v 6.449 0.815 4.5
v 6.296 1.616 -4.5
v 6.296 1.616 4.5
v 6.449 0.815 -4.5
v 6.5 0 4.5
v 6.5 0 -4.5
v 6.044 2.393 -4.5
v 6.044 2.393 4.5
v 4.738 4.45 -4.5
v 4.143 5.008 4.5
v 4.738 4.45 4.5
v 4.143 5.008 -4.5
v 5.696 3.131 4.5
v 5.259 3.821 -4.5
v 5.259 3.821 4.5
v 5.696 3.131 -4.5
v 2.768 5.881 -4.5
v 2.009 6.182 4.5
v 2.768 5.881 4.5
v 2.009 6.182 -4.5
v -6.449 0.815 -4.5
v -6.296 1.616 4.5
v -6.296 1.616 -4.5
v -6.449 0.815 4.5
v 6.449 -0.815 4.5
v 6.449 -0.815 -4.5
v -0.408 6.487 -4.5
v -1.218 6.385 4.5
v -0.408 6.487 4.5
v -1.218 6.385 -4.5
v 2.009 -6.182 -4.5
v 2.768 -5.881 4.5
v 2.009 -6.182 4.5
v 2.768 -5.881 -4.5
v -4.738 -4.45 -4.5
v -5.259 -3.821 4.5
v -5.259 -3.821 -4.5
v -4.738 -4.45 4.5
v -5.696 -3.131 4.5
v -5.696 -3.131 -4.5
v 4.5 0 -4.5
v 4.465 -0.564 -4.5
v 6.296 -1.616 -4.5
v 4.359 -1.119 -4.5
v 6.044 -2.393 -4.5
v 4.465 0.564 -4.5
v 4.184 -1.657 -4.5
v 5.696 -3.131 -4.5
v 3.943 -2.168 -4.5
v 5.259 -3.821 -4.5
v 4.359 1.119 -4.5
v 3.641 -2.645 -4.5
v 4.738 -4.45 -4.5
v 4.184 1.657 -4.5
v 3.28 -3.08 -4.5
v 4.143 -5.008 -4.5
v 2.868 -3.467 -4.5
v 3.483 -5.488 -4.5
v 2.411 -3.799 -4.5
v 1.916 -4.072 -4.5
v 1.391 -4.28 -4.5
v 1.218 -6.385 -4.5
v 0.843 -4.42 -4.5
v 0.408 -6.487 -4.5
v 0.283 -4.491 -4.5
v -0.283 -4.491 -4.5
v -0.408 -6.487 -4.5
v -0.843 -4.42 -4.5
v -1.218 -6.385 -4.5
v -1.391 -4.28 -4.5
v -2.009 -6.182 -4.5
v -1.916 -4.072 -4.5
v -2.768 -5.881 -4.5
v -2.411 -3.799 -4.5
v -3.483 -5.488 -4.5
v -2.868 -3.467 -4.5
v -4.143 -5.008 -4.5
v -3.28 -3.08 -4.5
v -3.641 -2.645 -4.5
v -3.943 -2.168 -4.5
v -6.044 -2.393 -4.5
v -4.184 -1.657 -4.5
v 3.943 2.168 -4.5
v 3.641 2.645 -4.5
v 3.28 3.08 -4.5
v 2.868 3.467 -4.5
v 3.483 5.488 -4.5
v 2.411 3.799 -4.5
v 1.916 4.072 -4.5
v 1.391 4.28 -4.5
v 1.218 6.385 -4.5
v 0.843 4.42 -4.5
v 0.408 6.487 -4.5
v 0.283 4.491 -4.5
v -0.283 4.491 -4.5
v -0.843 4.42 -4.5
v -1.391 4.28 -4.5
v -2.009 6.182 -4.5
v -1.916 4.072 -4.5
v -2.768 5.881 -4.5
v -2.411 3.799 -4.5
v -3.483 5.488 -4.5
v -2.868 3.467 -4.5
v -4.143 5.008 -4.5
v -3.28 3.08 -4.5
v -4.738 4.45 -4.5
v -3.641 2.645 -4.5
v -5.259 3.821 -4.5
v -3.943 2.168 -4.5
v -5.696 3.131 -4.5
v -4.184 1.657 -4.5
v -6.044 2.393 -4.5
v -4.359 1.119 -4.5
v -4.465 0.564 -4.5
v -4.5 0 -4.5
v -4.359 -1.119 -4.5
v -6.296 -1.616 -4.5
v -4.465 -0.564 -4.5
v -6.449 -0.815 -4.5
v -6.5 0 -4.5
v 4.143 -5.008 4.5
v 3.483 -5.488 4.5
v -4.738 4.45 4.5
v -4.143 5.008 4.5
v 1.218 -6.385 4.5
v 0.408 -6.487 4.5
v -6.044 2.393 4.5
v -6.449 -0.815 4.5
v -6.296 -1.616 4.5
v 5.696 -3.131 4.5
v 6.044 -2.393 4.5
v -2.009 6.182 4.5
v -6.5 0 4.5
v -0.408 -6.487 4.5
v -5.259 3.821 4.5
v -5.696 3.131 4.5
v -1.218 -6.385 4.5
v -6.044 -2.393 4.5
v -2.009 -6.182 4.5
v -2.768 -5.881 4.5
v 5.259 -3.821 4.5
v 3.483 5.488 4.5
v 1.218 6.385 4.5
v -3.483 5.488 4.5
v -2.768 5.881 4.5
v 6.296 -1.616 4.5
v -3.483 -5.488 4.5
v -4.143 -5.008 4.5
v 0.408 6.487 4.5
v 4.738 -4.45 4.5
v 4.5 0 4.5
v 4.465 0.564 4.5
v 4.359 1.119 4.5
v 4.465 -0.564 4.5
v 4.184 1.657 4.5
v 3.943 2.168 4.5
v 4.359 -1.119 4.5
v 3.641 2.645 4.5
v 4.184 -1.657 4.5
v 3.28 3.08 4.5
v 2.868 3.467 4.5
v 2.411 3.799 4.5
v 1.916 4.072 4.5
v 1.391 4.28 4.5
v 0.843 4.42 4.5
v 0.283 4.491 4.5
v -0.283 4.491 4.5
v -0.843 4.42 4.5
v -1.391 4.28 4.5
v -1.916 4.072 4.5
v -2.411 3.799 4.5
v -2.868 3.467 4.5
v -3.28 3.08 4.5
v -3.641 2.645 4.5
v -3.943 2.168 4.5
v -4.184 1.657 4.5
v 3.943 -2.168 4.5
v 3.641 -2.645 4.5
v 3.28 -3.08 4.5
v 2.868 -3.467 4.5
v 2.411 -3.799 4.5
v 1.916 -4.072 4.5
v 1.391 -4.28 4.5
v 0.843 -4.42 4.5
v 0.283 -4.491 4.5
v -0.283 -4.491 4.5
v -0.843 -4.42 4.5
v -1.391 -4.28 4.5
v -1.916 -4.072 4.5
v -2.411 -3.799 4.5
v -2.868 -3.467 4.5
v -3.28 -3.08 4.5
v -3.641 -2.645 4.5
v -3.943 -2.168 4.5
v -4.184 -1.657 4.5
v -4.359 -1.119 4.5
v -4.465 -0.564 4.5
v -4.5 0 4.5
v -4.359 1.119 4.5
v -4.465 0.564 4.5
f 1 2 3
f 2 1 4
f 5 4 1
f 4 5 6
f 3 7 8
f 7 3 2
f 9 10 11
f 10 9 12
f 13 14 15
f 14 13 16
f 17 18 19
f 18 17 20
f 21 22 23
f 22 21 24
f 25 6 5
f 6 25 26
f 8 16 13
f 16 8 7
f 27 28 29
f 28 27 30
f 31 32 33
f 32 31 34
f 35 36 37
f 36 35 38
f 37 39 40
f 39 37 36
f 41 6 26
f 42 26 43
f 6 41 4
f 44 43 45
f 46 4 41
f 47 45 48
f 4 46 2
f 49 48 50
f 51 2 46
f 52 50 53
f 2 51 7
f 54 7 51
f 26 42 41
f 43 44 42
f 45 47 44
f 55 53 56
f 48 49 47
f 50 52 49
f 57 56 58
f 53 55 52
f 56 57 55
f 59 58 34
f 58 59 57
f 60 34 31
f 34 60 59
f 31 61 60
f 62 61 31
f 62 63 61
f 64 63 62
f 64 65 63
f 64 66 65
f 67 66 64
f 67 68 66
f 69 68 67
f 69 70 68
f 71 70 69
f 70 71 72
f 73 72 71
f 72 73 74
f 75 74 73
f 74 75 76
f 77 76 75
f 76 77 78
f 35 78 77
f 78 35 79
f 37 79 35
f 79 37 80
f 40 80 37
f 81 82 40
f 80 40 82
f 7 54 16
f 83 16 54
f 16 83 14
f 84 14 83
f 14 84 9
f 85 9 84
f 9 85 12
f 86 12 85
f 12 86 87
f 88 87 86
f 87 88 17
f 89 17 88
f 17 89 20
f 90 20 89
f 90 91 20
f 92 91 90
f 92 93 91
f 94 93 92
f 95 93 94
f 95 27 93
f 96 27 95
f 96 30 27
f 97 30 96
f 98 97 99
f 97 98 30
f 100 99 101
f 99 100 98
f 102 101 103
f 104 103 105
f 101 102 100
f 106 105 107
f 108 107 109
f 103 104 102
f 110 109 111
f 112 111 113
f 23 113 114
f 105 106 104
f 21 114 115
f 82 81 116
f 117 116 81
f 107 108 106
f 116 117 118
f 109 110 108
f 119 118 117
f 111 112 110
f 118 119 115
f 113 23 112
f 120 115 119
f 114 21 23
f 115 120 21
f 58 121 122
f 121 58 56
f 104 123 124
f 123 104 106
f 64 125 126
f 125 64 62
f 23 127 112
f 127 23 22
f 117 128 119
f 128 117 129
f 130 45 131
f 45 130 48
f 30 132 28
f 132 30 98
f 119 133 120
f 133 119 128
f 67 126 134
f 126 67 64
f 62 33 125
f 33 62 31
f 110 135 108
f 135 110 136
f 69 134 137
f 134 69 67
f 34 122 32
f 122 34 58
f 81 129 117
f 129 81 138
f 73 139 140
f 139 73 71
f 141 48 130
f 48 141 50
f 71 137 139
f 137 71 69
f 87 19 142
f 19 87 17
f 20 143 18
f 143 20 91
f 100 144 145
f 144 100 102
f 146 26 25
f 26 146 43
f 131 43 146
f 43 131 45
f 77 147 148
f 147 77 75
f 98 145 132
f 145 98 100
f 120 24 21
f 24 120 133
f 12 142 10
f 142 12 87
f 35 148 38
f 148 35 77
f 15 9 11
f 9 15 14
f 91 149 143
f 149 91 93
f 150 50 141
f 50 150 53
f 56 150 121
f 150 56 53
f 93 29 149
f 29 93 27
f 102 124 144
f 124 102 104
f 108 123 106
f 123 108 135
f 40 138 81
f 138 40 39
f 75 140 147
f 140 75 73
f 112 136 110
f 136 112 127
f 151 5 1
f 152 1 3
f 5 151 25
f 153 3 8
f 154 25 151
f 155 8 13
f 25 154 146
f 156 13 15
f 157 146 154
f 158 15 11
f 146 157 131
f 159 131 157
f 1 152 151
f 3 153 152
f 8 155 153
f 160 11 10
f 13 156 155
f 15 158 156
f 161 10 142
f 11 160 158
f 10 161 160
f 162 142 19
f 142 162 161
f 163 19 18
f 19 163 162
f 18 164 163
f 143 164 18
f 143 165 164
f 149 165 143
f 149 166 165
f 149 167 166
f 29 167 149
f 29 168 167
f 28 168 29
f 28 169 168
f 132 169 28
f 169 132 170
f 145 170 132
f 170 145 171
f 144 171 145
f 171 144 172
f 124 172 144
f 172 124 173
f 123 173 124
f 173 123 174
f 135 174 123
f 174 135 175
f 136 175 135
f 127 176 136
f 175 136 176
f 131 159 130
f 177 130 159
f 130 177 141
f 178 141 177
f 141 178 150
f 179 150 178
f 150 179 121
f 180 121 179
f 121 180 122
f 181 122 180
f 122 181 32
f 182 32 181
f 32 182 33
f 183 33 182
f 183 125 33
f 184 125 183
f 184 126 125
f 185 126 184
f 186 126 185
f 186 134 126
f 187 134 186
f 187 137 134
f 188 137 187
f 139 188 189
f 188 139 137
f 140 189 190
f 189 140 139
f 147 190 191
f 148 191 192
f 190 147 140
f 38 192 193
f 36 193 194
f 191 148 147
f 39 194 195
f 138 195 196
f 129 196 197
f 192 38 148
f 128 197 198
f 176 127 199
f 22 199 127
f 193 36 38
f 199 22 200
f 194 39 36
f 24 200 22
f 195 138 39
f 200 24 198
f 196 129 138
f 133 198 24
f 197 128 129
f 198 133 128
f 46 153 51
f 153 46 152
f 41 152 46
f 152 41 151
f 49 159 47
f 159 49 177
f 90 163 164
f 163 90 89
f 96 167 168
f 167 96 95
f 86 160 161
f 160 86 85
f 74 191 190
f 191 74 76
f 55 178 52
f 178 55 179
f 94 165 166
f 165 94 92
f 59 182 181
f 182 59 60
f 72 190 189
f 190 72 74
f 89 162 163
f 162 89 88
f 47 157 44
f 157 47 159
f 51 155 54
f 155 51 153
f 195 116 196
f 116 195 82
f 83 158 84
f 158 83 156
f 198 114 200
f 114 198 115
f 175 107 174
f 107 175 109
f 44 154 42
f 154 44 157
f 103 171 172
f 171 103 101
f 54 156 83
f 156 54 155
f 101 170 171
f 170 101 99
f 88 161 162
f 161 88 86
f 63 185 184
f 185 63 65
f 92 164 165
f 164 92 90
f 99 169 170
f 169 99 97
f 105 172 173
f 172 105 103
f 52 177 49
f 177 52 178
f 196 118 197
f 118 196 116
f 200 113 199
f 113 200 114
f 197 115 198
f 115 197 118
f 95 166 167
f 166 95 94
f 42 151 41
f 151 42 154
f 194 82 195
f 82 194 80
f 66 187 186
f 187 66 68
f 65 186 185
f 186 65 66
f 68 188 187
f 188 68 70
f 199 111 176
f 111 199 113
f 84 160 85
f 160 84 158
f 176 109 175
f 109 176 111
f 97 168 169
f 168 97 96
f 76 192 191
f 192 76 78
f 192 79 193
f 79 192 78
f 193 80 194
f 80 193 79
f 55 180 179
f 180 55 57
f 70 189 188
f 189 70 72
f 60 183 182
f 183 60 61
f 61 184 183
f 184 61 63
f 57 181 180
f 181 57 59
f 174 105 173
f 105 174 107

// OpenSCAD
$fn = 50;


difference() {
	union() {
		translate(v = [0, 0, -4.5000000000]) {
			cylinder(h = 9, r = 6.5000000000);
		}
	}
	union() {
		translate(v = [0, 0, -100.0000000000]) {
			cylinder(h = 200, r = 4.5000000000);
		}
	}
}
